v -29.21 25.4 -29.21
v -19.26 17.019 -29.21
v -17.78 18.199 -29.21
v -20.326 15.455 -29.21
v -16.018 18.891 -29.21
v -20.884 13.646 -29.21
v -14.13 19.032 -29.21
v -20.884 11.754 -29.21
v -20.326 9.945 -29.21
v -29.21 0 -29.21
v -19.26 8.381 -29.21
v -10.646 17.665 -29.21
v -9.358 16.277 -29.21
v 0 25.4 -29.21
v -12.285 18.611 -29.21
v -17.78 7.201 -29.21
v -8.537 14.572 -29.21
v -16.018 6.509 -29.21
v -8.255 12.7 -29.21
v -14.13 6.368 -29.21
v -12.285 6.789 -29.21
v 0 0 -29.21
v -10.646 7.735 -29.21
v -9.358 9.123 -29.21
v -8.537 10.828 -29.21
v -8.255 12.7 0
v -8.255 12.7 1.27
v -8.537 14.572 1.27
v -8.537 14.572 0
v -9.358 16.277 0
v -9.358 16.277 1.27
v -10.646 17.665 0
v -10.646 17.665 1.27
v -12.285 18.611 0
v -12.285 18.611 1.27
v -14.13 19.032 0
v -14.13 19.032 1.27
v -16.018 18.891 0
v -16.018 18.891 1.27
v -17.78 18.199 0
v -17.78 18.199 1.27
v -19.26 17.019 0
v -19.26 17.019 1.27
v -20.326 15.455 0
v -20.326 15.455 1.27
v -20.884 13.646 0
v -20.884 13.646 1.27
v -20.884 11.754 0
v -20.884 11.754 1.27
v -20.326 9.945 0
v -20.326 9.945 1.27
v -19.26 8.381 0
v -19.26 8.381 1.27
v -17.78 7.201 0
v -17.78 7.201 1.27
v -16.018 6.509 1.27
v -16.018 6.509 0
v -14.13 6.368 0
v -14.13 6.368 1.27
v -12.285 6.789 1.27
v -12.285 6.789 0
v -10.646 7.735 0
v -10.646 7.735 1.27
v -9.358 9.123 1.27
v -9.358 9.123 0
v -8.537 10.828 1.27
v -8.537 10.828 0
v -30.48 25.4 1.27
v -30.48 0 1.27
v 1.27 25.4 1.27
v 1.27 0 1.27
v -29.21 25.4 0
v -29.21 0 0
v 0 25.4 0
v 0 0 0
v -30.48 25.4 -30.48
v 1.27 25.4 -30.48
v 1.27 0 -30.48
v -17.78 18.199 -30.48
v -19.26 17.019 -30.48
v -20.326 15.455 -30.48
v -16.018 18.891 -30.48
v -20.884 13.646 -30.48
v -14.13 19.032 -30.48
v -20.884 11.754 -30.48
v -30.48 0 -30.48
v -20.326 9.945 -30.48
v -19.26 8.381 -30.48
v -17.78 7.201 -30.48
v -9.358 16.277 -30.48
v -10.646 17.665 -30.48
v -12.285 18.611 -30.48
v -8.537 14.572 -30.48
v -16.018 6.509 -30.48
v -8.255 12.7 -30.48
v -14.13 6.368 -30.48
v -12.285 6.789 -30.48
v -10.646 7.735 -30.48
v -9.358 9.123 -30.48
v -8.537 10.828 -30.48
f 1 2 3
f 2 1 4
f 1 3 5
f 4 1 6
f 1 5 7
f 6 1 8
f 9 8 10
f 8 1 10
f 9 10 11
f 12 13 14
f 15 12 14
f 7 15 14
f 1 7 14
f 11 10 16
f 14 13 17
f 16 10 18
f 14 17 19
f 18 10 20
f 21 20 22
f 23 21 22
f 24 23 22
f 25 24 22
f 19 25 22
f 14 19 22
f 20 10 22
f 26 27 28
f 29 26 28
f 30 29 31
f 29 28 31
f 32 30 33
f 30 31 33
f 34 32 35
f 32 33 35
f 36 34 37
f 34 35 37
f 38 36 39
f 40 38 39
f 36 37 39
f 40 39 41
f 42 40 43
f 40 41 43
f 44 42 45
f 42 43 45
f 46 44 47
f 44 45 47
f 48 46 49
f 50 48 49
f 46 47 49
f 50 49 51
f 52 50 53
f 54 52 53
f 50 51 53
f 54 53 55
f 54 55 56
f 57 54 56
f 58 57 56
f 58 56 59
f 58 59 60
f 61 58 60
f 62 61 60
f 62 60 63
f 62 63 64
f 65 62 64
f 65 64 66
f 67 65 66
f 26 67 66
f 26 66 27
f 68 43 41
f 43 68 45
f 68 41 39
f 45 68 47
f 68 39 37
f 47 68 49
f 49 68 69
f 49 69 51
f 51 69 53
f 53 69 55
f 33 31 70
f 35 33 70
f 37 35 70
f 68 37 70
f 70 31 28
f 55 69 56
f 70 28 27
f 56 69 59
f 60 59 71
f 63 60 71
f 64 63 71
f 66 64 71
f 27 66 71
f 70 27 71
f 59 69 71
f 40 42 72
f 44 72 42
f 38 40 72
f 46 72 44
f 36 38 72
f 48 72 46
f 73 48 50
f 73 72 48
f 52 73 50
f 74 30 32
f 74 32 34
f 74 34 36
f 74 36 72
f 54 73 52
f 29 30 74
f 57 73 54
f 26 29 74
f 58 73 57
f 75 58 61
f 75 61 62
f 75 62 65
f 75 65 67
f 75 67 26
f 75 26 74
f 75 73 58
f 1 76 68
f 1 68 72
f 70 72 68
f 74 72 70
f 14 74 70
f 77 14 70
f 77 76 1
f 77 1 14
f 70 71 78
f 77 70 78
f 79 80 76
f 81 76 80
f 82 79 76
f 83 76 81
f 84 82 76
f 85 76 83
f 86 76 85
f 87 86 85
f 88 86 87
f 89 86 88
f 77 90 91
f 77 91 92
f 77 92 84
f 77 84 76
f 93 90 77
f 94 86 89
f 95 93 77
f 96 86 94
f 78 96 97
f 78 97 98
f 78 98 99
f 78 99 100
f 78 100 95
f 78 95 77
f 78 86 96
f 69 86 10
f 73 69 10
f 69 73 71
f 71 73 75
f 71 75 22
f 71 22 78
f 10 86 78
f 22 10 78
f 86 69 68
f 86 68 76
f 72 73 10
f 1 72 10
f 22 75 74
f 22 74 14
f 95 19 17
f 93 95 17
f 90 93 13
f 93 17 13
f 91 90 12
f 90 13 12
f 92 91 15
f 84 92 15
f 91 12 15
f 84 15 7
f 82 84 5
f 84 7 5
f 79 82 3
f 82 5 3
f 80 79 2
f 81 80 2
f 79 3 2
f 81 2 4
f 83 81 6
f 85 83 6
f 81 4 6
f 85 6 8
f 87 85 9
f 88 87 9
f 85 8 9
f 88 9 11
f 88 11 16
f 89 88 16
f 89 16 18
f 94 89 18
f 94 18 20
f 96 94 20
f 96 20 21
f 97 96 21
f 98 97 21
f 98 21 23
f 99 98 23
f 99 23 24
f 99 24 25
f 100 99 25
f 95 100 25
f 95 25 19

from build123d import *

# Parameters (mm, degrees)
SKETCH1_W           = 31.75
SKETCH1_H           = 31.75
SKETCH1_W_2         = 29.21
SKETCH1_H_2         = 29.21
BOSS_EXTRUDE1_DEPTH = 25.4
CUT_EXTRUDE1_REACH  = 52.816
SKETCH2_R           = 6.35


with BuildPart() as part:
    # Sketch1 → Boss-Extrude1 (new body)
    with BuildSketch(Plane(origin=(0, 0, 0), x_dir=(1, 0, 0), z_dir=(0, 1, 0))):
        with Locations((-14.605, 14.605)):
            Rectangle(SKETCH1_W, SKETCH1_H)
        with Locations((-14.605, 14.605)):
            Rectangle(SKETCH1_W_2, SKETCH1_H_2, mode=Mode.SUBTRACT)
    extrude(amount=BOSS_EXTRUDE1_DEPTH)

    # Cut-Extrude1: up to this face of the body (flat: up to its plane)
    cut_extrude1_end = Plane(part.part.faces().sort_by_distance((-14.605, 12.7, -30.48))[0])
    # Sketch2 → Cut-Extrude1 (cut, up to the picked face)
    with BuildSketch(Plane.XY.offset(1.27), mode=Mode.PRIVATE) as cut_extrude1_sk1:
        with Locations((-14.605, 12.7)):
            Circle(SKETCH2_R)
    cut_extrude1_tool1 = split(extrude(cut_extrude1_sk1.sketch, amount=-CUT_EXTRUDE1_REACH, mode=Mode.PRIVATE), bisect_by=cut_extrude1_end, keep=Keep.BOTH, mode=Mode.PRIVATE)
    add(cut_extrude1_tool1.solids().sort_by(Axis((-14.605, 12.7, 1.27), (0, 0, -1)))[0], mode=Mode.SUBTRACT)


solid = part.part
